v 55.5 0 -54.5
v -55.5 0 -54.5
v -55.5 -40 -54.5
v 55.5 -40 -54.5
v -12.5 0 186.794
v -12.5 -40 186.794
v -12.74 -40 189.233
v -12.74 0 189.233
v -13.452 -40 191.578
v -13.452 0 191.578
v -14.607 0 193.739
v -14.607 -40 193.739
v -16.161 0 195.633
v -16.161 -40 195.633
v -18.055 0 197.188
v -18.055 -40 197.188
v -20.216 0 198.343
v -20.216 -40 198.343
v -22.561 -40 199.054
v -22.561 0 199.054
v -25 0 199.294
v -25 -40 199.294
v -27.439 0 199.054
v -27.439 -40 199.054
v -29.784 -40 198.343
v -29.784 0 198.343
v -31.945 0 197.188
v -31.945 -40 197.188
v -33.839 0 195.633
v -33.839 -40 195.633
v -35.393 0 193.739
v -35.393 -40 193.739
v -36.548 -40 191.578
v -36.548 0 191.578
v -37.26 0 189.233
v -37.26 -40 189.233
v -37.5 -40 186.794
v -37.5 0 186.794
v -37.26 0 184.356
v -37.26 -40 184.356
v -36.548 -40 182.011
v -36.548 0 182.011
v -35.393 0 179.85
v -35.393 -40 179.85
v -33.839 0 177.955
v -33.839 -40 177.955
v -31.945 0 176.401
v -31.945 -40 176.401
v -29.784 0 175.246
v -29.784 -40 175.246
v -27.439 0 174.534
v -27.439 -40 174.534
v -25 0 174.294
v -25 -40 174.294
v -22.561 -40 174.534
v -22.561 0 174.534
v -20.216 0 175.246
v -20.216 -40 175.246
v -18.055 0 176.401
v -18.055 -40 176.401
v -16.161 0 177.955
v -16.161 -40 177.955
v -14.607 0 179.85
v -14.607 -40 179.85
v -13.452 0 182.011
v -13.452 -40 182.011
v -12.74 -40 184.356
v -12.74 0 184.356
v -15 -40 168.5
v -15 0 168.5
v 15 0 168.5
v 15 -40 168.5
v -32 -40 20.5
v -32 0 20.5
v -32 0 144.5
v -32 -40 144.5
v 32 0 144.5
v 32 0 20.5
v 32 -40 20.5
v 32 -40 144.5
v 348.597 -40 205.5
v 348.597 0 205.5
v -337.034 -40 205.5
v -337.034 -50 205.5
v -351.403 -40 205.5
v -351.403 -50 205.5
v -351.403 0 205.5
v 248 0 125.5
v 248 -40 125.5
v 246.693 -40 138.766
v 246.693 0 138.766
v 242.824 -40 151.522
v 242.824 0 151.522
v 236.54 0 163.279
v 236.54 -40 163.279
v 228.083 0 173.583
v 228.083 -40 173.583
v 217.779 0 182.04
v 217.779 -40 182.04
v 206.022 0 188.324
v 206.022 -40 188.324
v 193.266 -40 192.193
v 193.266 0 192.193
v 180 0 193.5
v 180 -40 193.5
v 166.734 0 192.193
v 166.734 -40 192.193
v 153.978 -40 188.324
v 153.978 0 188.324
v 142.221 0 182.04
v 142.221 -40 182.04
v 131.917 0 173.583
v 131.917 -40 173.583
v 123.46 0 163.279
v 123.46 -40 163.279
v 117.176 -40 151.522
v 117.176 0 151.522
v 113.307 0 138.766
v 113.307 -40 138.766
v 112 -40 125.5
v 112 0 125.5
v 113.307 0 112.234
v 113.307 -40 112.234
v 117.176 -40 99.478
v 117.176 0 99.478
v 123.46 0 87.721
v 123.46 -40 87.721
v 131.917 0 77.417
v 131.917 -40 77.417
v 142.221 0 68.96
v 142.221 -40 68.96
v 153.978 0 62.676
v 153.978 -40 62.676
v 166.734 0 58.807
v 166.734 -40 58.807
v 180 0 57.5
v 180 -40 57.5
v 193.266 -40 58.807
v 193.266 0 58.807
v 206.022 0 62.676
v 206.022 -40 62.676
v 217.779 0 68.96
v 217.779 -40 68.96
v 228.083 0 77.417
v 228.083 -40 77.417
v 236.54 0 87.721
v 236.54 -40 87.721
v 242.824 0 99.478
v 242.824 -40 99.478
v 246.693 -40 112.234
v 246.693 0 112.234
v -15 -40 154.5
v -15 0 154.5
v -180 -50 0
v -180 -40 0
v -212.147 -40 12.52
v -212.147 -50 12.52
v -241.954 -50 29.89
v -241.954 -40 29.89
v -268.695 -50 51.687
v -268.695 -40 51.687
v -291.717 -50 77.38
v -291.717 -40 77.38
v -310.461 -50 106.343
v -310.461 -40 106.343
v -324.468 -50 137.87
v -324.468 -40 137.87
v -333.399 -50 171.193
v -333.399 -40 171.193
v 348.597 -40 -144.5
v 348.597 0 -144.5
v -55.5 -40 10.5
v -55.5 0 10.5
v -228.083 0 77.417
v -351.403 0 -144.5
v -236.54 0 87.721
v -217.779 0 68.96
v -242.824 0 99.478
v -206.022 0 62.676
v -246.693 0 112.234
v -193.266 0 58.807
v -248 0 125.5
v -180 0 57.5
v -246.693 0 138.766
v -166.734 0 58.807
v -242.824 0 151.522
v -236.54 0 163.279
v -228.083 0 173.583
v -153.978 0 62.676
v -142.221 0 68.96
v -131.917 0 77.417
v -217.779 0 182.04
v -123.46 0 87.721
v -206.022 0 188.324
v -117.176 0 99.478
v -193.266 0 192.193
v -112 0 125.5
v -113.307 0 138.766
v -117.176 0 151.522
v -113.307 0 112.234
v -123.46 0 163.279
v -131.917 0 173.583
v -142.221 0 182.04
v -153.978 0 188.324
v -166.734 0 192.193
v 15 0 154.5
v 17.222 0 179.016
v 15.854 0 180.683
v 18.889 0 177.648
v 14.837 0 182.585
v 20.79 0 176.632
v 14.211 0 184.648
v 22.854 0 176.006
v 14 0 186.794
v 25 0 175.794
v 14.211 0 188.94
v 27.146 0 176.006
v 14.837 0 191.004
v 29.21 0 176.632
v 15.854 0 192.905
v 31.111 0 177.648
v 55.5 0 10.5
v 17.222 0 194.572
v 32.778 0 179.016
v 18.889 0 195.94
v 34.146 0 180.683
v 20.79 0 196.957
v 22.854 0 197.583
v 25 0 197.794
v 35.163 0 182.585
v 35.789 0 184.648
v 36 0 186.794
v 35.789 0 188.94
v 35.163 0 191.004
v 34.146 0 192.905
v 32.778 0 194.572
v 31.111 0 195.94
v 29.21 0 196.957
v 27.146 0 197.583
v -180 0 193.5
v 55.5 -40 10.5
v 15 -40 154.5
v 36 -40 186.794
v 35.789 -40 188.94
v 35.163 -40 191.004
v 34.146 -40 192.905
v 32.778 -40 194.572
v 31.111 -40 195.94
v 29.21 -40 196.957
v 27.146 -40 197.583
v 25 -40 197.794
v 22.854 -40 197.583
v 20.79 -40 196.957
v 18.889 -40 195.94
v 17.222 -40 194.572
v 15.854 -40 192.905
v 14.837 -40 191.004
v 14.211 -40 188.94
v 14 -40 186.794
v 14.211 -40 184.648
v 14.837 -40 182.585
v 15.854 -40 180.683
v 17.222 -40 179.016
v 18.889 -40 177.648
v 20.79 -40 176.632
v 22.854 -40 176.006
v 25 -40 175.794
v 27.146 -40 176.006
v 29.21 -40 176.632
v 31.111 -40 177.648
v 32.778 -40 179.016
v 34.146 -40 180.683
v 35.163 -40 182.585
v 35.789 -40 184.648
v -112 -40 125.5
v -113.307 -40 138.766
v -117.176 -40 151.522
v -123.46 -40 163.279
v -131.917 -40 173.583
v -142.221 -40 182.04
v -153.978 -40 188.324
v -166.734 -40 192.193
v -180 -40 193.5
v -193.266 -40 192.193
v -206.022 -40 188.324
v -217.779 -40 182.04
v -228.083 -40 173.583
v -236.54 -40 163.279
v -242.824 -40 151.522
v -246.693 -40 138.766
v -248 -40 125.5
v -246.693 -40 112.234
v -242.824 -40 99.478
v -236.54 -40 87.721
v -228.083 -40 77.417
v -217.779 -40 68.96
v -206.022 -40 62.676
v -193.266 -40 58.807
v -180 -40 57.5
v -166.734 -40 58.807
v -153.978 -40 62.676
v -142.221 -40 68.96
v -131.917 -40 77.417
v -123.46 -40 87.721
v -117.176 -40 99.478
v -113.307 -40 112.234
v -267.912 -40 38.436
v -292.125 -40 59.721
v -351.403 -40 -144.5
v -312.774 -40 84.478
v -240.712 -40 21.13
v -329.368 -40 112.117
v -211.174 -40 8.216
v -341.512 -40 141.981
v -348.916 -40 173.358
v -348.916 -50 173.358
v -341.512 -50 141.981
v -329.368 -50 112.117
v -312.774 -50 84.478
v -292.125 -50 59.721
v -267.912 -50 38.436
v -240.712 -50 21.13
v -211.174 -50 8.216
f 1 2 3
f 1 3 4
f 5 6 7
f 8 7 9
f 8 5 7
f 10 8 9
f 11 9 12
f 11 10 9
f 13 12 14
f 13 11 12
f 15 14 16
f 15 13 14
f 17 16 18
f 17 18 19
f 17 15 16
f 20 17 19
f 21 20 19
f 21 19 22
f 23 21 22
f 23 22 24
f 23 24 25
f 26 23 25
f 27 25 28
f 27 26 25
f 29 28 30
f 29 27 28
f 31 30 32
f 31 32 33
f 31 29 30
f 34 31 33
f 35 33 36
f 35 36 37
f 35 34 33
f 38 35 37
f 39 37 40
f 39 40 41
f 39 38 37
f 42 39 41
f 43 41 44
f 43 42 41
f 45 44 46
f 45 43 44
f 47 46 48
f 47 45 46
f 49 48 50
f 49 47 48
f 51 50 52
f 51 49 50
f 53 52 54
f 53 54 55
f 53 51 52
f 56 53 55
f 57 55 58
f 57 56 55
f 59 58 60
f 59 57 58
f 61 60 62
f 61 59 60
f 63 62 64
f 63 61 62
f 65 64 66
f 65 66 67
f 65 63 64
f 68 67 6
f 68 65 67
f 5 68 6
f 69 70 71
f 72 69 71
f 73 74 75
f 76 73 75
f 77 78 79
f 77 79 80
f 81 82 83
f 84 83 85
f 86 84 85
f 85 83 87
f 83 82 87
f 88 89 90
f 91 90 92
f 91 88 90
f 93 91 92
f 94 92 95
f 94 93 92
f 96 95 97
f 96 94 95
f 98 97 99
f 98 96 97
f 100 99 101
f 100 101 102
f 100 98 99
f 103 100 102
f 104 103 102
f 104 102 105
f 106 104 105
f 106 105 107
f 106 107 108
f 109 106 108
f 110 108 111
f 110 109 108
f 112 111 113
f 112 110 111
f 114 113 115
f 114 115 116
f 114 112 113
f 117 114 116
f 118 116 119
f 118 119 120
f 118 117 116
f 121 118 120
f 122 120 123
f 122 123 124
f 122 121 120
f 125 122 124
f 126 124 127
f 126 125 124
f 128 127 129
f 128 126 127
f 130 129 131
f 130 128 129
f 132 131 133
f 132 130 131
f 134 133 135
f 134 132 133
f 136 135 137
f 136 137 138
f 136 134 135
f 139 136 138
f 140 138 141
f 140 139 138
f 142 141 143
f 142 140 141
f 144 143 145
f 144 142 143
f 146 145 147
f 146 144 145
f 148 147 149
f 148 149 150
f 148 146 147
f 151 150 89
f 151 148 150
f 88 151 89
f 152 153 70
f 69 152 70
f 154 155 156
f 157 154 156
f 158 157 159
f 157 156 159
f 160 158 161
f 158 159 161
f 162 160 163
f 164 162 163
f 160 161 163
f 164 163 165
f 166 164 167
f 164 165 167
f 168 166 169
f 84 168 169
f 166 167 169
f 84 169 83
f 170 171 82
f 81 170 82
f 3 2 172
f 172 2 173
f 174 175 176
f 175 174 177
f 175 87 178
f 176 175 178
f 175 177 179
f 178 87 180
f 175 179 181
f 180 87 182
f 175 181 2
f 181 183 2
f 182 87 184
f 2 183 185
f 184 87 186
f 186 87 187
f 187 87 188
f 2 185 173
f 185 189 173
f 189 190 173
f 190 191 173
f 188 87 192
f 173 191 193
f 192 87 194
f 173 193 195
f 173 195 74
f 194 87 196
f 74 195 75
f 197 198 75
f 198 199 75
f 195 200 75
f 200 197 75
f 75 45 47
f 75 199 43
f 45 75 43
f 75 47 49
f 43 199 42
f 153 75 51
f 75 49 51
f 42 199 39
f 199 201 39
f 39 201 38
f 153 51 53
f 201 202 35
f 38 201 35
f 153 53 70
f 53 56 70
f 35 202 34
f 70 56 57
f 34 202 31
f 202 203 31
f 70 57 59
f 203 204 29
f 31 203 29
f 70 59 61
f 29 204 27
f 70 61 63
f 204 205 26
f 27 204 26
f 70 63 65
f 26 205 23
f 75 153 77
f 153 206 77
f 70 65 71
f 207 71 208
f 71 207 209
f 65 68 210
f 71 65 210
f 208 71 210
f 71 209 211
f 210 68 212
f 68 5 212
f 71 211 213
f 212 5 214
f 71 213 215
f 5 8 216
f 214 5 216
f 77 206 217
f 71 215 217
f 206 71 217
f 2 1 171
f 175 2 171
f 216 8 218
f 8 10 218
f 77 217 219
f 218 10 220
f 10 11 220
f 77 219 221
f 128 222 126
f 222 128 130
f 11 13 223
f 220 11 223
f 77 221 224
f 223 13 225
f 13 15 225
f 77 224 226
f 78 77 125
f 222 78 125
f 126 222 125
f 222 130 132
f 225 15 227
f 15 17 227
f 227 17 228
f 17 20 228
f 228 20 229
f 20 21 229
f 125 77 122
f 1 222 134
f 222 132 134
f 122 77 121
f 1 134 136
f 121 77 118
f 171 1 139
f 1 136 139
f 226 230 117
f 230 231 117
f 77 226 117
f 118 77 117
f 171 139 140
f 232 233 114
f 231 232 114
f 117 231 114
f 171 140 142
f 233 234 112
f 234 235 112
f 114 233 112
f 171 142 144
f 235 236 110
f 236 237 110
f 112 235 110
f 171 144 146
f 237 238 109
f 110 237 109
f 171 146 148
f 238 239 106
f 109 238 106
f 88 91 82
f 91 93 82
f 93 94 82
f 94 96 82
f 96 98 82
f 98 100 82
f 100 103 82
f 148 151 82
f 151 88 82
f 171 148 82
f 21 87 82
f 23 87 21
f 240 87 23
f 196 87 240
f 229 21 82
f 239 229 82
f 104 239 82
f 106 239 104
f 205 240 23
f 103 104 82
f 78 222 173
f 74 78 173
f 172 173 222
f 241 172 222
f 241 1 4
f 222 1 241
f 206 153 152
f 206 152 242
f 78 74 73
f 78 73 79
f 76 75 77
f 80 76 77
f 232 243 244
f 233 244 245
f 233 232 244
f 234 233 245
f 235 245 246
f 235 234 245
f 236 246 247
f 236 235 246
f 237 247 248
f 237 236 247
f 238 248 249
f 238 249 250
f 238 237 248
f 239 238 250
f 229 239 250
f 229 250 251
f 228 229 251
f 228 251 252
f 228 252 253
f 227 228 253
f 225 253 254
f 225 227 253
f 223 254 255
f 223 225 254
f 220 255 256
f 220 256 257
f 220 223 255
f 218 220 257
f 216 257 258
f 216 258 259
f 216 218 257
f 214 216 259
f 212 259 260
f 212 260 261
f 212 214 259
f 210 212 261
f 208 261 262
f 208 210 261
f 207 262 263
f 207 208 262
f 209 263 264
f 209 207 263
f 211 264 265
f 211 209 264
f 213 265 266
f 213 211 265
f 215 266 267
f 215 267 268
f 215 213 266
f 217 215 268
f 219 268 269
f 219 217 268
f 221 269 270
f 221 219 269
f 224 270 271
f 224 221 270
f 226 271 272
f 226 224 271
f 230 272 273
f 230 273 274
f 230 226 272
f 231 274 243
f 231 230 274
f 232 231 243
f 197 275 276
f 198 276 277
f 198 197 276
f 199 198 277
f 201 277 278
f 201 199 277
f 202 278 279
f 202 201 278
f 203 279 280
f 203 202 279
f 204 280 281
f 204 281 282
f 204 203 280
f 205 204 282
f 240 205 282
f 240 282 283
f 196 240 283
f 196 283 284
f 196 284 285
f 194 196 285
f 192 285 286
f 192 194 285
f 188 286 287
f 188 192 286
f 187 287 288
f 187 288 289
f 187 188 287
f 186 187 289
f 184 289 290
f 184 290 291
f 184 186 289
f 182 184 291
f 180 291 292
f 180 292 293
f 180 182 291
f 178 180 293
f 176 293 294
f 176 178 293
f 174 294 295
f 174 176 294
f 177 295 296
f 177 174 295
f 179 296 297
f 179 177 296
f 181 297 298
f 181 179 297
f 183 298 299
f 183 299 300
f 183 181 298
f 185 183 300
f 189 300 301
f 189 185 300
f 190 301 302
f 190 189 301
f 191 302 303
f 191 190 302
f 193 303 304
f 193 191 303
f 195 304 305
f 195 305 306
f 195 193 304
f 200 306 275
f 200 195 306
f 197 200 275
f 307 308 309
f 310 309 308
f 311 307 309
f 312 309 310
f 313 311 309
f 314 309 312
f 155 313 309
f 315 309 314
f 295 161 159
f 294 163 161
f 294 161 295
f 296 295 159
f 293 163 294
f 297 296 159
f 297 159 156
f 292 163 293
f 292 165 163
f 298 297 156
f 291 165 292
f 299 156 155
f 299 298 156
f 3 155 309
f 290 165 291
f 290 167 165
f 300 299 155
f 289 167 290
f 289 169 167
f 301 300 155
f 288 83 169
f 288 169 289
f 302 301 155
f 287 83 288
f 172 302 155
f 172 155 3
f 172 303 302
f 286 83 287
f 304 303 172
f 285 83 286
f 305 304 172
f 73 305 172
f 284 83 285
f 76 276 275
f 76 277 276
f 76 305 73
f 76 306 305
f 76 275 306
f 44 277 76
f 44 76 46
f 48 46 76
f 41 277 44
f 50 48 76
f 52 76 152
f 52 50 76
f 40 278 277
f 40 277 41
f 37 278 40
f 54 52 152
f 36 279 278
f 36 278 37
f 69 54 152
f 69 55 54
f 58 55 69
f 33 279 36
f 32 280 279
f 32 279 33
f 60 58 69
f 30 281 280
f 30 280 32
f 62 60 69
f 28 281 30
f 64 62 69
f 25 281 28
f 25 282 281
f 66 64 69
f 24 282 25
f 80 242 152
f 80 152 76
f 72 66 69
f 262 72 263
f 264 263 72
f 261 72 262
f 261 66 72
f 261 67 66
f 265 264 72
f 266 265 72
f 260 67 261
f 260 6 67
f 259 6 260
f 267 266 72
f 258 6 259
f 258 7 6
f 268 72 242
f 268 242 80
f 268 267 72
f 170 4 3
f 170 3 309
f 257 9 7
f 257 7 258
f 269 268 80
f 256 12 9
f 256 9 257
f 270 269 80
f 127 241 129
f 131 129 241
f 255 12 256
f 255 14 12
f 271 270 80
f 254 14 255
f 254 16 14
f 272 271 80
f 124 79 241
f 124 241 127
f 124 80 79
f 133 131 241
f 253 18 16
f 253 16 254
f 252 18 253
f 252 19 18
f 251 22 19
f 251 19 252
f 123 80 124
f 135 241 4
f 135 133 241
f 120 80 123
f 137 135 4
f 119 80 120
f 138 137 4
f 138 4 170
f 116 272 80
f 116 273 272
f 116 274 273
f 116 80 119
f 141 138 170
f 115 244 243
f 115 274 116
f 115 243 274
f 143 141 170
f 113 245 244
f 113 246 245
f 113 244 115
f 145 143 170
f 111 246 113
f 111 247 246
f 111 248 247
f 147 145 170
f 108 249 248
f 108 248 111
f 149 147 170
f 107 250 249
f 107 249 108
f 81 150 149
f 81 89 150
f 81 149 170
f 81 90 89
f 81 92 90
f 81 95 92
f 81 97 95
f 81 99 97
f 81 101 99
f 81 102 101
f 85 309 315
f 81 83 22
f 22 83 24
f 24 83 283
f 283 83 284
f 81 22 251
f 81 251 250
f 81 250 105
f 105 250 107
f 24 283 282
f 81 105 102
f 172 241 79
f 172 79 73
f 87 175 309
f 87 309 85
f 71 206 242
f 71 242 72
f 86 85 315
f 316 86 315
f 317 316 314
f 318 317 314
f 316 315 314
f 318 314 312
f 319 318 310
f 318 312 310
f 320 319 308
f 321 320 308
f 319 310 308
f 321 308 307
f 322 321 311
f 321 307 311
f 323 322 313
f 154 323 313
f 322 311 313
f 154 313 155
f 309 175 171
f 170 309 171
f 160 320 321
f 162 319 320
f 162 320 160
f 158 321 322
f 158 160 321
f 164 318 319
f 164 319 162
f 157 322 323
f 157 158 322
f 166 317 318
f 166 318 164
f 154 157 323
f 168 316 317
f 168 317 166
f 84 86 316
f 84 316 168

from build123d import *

# Parameters (mm, degrees)
F1_W     = 560
F1_H     = 350
F1_W_2   = 111
F1_H_2   = 65
F1_R     = 68
F1_R_2   = 12.5
F1_W_3   = 64
F1_H_3   = 124
F1_W_4   = 30
F1_H_4   = 14
F1_R_3   = 11
F2_DEPTH = 40
F1_W_5   = 70
F3_DEPTH = 40
F4_DEPTH = 270
F6_DEPTH = 10


with BuildPart() as f2:
    # F1 (on Front) → F2 (new body)
    with BuildSketch(Plane.XZ):
        with Locations((-1.403241, 30.5)):
            Rectangle(F1_W, F1_H)
        with Locations((0, -22)):
            Rectangle(F1_W_2, F1_H_2, mode=Mode.SUBTRACT)
        with Locations((-180, 125.5)):
            Circle(F1_R, mode=Mode.SUBTRACT)
        with Locations((-25, 186.794207)):
            Circle(F1_R_2, mode=Mode.SUBTRACT)
        with Locations((0, 82.5)):
            Rectangle(F1_W_3, F1_H_3, mode=Mode.SUBTRACT)
        with Locations((0, 161.5)):
            Rectangle(F1_W_4, F1_H_4, mode=Mode.SUBTRACT)
        with Locations((25, 186.794207)):
            Circle(F1_R_3, mode=Mode.SUBTRACT)
        with Locations((180, 125.5)):
            Circle(F1_R, mode=Mode.SUBTRACT)
    extrude(amount=F2_DEPTH)

    # F1 (on Front) → F3 (join)
    with BuildSketch(Plane.XZ):
        with Locations((-316.403241, 30.5)):
            Rectangle(F1_W_5, F1_H)
        with Locations((313.596759, 30.5)):
            Rectangle(F1_W_5, F1_H)
    extrude(amount=F3_DEPTH)

    # F1 (on Front) → F4 (cut)
    with BuildSketch(Plane.XZ):
        with Locations((-180, 125.5)):
            Circle(F1_R)
        with Locations((180, 125.5)):
            Circle(F1_R)
        with Locations((-25, 186.794207)):
            Circle(F1_R_2)
        with Locations((25, 186.794207)):
            Circle(F1_R_3)
        with Locations((0, 161.5)):
            Rectangle(F1_W_4, F1_H_4)
        with Locations((0, 82.5)):
            Rectangle(F1_W_3, F1_H_3)
        with Locations((0, -22)):
            Rectangle(F1_W_2, F1_H_2)
    extrude(amount=-F4_DEPTH, mode=Mode.SUBTRACT)

    # F5 (on face) → F6 (join)
    with BuildSketch(Plane.XZ.offset(40)):
        with BuildLine():
            Line((-337.034283, 205.5), (-351.403241, 205.5))
            ThreePointArc((-351.403241, 205.5), (-302.927817, 71.70041), (-180, 0))
            ThreePointArc((-180, 0), (-291.71711, 77.380009), (-337.034283, 205.5))
        make_face()
    extrude(amount=F6_DEPTH)


solid = f2.part
